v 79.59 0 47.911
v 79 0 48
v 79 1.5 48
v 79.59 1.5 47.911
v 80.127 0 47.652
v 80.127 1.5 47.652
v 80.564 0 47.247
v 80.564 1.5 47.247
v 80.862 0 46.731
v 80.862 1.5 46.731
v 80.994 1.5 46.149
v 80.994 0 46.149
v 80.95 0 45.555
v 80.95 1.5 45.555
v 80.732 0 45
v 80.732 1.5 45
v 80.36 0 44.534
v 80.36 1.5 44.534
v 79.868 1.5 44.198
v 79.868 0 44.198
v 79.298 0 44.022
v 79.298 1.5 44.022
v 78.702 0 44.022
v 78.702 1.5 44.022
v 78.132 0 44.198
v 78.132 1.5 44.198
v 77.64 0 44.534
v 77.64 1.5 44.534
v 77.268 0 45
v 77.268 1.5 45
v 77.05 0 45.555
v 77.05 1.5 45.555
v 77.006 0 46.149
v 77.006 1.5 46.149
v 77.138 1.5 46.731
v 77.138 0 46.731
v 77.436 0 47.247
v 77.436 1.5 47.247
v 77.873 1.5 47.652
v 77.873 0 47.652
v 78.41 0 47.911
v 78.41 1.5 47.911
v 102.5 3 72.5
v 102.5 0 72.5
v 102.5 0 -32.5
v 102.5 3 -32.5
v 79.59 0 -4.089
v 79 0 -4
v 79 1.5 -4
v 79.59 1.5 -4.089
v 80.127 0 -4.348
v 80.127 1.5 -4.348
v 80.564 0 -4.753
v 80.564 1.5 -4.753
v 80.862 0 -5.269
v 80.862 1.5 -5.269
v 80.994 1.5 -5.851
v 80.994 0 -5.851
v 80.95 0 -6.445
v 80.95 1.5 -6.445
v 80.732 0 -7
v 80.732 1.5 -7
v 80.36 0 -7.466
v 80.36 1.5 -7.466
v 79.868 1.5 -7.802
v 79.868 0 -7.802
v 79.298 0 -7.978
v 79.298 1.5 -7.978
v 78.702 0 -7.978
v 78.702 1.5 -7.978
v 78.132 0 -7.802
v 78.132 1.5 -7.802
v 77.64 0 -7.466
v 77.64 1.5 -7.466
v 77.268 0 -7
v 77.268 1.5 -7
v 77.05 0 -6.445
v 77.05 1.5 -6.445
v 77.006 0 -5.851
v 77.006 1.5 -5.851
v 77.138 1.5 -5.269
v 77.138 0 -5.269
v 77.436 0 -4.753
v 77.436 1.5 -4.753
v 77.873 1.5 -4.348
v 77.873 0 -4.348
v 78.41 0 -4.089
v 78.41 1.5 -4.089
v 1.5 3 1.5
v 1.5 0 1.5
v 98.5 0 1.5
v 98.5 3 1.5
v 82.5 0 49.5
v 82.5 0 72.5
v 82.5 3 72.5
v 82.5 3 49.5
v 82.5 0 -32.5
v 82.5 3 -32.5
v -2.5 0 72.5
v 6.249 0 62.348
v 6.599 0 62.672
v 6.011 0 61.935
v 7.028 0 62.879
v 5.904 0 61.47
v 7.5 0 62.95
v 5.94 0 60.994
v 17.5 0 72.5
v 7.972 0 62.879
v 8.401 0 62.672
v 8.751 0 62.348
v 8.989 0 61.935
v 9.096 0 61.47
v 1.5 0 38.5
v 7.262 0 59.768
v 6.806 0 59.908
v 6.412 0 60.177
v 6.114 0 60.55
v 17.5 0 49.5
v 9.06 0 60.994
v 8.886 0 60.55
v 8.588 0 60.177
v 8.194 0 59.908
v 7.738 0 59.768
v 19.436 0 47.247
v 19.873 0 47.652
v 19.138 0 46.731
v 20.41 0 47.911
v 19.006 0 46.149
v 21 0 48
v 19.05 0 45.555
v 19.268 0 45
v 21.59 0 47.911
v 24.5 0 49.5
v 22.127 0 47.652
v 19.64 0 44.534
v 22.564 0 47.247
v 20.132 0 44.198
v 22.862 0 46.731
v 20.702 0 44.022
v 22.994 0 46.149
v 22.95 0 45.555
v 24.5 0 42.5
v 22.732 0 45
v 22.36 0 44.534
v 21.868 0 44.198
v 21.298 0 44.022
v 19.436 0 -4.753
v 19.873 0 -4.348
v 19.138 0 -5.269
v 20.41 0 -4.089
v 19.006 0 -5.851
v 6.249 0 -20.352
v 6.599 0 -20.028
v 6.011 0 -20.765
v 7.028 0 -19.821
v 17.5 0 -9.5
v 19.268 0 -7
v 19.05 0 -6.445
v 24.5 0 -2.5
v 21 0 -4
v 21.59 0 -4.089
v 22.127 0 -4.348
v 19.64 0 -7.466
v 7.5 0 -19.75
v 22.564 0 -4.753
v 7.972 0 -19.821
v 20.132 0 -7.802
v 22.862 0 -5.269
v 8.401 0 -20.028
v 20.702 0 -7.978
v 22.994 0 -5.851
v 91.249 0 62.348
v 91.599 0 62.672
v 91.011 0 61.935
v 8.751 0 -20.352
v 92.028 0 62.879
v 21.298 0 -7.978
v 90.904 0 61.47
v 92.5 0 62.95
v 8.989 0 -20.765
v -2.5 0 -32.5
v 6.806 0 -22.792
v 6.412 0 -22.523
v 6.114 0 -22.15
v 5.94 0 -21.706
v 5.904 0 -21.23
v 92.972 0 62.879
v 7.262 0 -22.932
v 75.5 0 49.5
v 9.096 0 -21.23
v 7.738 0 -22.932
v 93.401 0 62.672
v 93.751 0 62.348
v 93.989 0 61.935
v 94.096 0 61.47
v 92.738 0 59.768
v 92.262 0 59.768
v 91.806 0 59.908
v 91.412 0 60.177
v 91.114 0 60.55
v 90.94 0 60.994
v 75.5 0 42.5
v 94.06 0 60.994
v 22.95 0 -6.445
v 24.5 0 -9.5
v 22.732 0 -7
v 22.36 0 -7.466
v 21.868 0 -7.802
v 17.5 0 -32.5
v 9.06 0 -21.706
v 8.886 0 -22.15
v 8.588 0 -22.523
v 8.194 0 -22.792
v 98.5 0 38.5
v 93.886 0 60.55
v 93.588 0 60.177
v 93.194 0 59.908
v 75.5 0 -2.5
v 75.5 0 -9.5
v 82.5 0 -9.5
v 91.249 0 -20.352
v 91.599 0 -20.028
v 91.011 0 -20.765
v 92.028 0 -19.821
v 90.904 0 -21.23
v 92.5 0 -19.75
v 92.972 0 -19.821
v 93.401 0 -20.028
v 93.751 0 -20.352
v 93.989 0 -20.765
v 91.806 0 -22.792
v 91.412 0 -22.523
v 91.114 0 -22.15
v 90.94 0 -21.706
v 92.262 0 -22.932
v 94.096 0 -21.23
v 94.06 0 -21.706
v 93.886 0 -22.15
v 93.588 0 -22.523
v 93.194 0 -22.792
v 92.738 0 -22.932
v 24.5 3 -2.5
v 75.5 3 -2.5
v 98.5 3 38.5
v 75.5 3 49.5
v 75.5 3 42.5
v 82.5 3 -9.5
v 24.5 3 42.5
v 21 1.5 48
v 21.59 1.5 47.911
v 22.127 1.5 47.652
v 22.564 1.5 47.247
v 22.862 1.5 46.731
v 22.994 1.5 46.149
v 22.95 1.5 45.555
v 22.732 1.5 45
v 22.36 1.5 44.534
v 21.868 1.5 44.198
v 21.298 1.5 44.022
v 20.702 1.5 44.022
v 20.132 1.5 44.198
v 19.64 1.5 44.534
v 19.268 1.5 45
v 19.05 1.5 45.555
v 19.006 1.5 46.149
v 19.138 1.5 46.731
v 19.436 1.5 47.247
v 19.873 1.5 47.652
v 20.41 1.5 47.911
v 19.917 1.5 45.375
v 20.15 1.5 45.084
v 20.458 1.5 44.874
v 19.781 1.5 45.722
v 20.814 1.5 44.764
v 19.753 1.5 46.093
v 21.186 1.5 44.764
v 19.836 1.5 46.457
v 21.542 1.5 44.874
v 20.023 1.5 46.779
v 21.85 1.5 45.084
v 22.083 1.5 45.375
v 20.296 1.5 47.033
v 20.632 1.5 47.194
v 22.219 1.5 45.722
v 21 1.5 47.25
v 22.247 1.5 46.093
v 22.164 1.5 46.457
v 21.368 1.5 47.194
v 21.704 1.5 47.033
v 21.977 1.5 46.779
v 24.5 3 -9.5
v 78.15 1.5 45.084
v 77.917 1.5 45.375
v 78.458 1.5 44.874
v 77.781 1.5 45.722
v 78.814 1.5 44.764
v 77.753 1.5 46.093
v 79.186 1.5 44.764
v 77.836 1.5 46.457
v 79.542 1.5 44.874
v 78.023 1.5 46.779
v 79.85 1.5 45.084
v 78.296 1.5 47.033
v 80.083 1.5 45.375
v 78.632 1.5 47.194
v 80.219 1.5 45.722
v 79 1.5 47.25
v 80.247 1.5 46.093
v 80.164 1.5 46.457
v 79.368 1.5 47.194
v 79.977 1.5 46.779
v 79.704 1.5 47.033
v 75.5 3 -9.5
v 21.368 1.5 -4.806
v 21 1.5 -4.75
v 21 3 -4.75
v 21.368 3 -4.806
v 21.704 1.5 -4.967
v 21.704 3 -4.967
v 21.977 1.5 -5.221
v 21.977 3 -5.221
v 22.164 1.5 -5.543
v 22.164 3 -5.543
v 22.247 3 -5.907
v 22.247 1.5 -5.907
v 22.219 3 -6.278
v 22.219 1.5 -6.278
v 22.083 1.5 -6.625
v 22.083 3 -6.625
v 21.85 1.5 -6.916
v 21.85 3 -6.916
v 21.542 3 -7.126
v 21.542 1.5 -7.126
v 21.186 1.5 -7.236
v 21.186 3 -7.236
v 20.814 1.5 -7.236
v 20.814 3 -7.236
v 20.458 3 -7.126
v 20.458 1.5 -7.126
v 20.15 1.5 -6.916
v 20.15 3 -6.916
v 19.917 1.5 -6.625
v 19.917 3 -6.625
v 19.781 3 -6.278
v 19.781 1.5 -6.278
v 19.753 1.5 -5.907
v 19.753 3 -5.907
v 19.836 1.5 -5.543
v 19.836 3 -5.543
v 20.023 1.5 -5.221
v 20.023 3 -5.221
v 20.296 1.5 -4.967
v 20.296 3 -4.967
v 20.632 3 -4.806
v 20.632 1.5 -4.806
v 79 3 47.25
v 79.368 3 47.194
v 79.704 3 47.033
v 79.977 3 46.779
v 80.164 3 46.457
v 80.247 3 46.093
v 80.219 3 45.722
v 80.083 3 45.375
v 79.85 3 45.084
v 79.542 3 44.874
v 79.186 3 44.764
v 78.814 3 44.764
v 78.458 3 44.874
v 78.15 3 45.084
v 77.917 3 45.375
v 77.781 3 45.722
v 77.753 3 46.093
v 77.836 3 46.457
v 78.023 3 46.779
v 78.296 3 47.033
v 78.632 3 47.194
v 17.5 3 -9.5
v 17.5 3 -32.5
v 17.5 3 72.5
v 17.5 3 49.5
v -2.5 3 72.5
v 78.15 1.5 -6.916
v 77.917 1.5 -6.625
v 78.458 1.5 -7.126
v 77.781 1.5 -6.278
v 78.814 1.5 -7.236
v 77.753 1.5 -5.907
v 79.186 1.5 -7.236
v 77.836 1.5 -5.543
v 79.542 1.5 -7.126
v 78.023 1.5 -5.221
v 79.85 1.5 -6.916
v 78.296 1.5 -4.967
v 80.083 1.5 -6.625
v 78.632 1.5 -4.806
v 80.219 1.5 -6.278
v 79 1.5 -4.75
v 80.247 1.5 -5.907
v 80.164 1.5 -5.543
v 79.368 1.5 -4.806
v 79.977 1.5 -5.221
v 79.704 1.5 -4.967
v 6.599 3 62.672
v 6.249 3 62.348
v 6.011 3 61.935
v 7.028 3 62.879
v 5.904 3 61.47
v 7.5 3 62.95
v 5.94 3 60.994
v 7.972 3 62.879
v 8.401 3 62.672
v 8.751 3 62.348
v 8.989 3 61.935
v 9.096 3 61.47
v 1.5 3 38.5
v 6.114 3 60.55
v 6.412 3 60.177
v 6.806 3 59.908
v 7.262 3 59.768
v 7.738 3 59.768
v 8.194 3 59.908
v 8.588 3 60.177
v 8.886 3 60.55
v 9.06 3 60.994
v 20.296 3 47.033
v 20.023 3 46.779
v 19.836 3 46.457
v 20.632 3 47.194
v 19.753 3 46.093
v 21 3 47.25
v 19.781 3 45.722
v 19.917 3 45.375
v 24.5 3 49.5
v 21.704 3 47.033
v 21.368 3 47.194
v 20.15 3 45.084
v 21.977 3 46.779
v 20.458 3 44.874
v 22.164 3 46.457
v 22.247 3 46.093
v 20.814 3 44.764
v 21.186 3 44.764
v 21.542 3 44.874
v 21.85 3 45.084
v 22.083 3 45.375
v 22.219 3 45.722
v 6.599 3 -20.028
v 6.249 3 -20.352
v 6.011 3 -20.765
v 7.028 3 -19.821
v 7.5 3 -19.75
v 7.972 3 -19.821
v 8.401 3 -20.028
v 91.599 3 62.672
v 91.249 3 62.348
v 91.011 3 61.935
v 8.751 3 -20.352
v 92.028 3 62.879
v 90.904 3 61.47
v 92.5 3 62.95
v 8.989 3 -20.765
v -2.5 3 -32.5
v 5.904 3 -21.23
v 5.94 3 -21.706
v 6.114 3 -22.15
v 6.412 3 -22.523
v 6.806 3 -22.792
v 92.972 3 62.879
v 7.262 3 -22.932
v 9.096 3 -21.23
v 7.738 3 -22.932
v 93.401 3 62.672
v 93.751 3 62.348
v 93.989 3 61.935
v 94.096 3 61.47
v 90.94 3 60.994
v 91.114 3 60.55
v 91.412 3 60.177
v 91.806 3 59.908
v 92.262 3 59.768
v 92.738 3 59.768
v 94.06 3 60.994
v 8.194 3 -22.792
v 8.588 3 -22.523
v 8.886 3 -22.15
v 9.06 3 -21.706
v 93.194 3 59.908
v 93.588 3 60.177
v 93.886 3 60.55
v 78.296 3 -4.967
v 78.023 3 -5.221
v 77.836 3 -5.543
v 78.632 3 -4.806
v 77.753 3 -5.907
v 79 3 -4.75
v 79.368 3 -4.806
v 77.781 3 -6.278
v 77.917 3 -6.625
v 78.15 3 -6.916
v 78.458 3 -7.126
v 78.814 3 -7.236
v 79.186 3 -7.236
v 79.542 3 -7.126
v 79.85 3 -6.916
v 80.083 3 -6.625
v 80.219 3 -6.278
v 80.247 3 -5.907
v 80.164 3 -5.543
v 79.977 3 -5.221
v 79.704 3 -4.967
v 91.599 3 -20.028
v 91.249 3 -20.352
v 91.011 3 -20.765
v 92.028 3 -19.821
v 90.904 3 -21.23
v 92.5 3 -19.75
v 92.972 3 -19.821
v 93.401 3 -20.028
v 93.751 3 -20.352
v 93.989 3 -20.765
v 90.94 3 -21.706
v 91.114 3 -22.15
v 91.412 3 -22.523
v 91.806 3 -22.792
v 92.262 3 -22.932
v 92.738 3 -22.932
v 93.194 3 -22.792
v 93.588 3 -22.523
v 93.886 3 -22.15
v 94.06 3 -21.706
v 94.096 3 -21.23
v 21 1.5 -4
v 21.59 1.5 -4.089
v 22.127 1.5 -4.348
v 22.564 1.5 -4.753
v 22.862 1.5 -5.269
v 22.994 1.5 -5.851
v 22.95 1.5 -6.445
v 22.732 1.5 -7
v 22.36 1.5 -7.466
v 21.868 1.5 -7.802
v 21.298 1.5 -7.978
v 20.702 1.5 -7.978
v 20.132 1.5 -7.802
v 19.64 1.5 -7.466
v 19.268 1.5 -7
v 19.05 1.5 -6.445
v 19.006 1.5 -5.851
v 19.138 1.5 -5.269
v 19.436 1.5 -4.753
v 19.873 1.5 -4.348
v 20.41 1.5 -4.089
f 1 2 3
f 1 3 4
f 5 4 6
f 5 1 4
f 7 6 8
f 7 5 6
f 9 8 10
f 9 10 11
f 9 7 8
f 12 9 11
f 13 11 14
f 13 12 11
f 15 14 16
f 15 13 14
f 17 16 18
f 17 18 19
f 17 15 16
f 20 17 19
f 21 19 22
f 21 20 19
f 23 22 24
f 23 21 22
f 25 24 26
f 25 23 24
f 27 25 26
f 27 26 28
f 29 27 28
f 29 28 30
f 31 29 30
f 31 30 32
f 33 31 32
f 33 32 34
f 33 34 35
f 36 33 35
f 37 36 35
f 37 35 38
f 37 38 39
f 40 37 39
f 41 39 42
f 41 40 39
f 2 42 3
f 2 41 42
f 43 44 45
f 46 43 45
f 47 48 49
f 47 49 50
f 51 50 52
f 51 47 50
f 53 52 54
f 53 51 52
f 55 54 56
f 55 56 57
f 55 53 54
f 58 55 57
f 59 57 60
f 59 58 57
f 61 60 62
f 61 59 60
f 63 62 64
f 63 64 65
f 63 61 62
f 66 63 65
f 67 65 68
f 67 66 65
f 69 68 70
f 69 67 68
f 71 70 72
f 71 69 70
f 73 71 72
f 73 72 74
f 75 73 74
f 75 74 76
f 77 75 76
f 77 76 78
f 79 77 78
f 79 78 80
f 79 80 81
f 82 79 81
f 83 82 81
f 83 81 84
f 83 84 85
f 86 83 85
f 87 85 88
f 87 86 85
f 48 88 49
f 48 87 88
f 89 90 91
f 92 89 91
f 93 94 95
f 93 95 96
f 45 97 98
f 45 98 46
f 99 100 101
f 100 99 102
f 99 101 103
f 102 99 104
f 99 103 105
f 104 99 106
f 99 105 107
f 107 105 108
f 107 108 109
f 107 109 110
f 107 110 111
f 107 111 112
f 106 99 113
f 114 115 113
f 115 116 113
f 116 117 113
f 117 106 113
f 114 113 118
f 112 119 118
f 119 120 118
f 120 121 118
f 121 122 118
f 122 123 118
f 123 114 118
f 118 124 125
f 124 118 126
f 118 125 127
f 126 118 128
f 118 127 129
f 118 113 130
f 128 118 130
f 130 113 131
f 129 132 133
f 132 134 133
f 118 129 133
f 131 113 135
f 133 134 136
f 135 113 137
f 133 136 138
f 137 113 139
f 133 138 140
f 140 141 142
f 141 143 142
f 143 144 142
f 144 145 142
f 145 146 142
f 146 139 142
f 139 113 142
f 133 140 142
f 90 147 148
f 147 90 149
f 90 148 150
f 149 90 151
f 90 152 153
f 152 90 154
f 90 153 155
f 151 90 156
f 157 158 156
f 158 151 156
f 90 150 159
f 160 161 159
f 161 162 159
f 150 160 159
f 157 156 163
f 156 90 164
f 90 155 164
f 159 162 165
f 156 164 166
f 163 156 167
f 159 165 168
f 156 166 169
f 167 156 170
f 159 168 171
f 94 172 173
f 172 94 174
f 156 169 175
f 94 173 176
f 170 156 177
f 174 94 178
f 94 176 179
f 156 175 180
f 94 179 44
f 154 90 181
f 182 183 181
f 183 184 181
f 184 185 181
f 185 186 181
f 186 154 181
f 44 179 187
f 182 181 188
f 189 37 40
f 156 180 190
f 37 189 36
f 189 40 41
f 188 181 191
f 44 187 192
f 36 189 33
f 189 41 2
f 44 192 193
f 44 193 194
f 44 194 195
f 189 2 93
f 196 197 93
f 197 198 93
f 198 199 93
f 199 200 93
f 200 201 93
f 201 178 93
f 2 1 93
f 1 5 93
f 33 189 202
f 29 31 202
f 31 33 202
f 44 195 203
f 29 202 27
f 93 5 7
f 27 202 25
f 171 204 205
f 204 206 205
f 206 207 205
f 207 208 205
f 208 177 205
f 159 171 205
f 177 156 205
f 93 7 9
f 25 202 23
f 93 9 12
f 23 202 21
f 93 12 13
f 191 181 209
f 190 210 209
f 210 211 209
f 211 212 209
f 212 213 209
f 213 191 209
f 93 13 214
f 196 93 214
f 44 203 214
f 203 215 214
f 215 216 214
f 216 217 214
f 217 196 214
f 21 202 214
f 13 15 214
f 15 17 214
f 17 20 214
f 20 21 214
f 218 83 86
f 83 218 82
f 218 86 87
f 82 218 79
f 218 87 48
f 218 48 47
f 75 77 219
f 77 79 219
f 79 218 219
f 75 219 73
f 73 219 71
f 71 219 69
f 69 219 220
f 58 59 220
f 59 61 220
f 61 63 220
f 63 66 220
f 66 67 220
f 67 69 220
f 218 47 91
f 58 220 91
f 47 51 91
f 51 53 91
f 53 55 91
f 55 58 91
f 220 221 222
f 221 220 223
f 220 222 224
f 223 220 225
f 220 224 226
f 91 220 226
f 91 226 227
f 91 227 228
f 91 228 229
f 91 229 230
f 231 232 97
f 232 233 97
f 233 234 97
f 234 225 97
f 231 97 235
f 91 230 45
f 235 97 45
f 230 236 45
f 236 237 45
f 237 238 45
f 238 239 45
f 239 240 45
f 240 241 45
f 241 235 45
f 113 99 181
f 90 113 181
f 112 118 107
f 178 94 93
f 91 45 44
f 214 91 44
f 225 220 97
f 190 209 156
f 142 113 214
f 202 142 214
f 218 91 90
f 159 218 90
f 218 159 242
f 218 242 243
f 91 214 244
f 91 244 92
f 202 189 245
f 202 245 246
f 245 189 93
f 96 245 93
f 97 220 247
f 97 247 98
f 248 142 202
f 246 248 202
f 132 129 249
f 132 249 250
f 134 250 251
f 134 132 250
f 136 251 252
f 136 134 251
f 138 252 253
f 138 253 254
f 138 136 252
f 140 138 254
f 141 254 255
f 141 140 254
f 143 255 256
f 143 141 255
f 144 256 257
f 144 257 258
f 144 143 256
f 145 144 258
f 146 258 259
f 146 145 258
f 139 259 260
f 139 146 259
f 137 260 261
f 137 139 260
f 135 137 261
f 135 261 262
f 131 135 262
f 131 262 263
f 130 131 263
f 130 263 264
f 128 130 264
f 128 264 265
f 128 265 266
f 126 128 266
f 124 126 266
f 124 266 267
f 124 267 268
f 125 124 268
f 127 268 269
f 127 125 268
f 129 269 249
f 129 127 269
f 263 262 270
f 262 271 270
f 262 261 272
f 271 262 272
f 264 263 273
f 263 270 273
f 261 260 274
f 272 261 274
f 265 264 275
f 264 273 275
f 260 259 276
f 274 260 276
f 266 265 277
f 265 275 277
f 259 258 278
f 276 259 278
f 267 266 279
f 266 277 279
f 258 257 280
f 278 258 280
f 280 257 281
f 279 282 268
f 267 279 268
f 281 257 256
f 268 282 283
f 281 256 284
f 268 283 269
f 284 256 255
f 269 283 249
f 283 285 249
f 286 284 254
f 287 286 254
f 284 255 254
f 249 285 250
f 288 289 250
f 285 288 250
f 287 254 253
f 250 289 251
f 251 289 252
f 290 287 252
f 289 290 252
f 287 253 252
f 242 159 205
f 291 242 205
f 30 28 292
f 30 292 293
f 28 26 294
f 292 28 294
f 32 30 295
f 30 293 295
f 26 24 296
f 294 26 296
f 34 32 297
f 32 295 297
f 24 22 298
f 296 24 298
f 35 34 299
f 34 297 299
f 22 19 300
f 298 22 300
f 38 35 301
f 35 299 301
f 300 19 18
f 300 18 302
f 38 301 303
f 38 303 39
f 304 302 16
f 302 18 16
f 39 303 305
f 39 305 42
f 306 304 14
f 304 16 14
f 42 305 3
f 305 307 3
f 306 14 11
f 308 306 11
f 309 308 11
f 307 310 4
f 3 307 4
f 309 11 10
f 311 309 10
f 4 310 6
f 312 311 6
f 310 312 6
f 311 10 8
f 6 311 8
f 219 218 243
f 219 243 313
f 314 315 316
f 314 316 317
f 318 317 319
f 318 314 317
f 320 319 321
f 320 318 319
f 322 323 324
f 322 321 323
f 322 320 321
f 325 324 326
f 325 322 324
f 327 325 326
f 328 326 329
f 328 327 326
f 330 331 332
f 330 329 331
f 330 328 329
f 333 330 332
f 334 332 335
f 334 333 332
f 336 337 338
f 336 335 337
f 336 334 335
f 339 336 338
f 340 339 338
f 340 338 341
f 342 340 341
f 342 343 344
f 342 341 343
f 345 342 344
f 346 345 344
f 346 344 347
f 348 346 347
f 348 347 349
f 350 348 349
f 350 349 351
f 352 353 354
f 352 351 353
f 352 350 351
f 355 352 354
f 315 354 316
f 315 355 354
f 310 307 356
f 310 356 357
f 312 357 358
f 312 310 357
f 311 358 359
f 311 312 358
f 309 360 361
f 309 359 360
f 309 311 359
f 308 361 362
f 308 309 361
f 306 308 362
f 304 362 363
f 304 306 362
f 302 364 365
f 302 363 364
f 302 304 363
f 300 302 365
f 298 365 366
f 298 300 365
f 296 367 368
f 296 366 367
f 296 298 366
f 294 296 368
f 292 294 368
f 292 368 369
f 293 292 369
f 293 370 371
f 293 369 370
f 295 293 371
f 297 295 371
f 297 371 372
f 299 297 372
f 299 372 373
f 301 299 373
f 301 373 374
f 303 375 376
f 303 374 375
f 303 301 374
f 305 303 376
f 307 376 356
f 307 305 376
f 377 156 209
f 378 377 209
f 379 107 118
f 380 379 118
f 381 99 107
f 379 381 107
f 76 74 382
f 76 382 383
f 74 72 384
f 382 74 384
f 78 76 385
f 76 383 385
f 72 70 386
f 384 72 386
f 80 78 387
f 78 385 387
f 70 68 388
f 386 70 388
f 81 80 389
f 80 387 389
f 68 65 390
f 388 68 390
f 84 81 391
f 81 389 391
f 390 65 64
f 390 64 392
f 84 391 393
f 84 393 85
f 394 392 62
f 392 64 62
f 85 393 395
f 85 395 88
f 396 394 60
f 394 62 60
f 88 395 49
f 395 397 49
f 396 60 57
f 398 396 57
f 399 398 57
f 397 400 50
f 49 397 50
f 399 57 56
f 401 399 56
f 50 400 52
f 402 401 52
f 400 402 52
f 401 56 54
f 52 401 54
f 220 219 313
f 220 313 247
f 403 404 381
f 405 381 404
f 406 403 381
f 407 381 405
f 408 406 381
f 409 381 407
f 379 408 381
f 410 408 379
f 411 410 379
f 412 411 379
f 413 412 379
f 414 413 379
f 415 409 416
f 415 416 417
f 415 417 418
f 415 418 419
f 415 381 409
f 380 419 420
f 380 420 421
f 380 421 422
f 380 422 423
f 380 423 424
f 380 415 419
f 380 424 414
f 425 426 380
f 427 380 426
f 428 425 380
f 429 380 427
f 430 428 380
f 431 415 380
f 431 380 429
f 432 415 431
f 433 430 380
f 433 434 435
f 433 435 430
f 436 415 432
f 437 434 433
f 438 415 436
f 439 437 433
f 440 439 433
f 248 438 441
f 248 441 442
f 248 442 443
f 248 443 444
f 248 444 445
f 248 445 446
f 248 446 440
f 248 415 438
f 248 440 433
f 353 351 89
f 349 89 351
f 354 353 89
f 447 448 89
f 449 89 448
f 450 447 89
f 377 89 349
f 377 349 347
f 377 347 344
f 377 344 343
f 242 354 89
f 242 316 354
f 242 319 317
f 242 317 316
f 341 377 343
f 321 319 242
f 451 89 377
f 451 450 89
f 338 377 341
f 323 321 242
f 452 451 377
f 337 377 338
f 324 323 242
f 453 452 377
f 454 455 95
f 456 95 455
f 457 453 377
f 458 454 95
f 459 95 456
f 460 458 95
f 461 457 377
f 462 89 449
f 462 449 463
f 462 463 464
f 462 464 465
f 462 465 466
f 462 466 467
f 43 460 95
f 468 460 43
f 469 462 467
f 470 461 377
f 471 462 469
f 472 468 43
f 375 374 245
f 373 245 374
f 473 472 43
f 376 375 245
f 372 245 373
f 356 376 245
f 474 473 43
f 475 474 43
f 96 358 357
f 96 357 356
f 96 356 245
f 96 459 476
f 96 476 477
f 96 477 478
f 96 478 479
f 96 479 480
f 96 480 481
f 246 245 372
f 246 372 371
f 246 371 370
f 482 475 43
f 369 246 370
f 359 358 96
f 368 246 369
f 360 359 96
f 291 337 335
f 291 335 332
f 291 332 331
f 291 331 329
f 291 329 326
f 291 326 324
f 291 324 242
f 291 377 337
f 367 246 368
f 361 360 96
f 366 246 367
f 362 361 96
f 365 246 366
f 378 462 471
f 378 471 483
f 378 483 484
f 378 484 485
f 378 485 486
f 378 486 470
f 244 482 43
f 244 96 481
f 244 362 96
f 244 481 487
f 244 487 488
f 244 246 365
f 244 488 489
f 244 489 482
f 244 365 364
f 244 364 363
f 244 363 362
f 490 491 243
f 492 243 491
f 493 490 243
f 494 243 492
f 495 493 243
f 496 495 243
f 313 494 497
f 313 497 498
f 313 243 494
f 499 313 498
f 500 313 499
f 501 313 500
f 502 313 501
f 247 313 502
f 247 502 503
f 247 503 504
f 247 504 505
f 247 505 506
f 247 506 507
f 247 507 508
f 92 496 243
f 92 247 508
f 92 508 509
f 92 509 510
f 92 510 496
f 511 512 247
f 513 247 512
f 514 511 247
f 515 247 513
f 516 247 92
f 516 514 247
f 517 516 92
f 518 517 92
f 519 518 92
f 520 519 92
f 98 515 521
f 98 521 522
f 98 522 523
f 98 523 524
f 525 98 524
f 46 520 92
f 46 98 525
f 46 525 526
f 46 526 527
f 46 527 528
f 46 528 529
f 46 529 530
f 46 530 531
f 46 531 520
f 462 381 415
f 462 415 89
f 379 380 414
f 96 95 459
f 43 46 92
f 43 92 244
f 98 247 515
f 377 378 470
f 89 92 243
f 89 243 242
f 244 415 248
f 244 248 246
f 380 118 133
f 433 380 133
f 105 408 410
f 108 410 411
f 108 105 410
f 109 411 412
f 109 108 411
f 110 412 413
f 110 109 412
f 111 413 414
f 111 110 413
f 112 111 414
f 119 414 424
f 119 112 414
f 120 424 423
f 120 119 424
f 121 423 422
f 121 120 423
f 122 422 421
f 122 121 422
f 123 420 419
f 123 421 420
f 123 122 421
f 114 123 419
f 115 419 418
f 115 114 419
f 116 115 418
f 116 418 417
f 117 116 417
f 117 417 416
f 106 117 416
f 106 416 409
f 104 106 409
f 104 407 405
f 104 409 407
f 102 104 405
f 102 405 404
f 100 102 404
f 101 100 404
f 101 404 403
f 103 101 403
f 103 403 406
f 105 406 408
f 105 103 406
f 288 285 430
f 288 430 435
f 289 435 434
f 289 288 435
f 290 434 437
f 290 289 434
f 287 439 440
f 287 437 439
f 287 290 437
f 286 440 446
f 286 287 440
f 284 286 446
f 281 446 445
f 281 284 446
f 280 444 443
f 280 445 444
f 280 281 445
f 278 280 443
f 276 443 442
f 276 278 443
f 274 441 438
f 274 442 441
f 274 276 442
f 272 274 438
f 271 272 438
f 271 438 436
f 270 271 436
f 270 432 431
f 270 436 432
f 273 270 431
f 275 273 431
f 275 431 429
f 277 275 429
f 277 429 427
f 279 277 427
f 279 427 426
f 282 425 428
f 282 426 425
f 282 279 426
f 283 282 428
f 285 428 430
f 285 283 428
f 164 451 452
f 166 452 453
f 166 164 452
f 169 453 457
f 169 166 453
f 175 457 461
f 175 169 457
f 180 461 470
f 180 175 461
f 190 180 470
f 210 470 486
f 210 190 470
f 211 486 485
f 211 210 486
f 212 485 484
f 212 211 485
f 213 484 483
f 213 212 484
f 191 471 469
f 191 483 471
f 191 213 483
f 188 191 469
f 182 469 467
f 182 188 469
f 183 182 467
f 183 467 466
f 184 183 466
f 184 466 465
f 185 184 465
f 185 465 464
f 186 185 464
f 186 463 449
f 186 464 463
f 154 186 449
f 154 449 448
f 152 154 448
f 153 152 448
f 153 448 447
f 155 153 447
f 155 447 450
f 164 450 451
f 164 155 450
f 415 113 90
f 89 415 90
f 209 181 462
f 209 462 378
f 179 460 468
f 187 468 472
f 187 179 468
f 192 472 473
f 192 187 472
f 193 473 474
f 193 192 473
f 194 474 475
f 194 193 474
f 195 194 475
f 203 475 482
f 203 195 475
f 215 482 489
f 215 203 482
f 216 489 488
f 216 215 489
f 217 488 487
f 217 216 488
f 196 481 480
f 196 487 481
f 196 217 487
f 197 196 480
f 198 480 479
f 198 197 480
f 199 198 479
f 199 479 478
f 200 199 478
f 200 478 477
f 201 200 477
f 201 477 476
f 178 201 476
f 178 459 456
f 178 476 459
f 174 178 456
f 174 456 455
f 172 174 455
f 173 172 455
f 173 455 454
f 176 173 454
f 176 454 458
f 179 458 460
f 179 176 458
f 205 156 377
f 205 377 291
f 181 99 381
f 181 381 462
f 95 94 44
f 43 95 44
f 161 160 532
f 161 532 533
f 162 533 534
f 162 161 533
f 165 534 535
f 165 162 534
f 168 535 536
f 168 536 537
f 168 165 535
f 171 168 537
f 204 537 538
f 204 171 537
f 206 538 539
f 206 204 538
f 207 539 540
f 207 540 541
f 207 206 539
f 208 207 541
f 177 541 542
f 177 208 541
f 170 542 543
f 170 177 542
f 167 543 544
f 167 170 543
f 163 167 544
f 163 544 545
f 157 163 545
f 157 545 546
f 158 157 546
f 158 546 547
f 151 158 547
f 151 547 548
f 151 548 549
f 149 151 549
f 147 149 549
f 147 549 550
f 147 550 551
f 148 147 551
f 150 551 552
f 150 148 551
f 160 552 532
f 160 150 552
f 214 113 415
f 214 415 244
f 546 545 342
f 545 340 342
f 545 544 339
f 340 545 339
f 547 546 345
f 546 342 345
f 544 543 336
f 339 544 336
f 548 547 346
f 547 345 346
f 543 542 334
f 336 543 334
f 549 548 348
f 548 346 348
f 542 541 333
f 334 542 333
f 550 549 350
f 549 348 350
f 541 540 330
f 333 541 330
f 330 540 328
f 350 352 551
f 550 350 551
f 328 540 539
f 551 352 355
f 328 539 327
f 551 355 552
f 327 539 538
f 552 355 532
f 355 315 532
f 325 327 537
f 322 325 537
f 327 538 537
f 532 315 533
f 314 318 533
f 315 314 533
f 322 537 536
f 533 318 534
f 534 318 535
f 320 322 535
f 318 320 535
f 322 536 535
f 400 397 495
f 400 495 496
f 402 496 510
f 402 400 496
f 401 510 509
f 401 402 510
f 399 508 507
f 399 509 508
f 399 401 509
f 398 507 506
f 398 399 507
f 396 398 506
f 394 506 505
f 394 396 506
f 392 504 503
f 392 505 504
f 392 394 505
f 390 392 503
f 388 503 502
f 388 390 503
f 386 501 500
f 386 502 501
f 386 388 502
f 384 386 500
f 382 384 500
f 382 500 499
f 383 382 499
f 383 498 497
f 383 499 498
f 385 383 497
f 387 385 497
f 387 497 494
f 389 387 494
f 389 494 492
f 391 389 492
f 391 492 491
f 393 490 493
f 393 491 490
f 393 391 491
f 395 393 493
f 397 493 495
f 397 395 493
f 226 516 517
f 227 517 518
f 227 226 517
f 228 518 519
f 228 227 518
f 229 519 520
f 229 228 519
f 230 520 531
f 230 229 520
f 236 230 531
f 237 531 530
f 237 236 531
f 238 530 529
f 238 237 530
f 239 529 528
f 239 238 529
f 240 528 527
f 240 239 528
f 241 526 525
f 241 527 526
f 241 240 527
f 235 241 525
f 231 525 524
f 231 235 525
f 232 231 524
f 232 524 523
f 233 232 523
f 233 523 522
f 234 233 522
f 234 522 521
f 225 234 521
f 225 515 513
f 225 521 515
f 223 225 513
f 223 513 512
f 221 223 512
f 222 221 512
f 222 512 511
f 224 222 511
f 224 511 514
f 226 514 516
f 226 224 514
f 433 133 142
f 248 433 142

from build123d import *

# Parameters (mm, degrees)
SKETCH_1_W          = 20
SKETCH_1_H          = 105
SKETCH_1_W_2        = 65
SKETCH_1_H_2        = 45
SKETCH_1_W_3        = 7
SKETCH_1_H_3        = 59
EXTRUDE_2_DEPTH     = 3
SKETCH_1_5_W        = 97
SKETCH_1_5_H        = 37
CUT_EXTRUDE_1_DEPTH = 126.584632818
SKETCH_1_6_R        = 1.25
SKETCH_1_6_R_2      = 1.6
CUT_EXTRUDE_3_DEPTH = 126.584632818
SKETCH_1_7_R        = 2
CUT_EXTRUDE_4_DEPTH = 1.5


with BuildPart() as part:
    # 草图1 → 凸台-拉伸2 (new body)
    with BuildSketch(Plane(origin=(0, 0, 0), x_dir=(1, 0, 0), z_dir=(0, 1, 0))):
        with Locations((7.5, -20)):
            Rectangle(SKETCH_1_W, SKETCH_1_H)
        with Locations((92.5, -20)):
            Rectangle(SKETCH_1_W, SKETCH_1_H)
        with Locations((50, -20)):
            Rectangle(SKETCH_1_W_2, SKETCH_1_H_2)
        with Locations((21, -20)):
            Rectangle(SKETCH_1_W_3, SKETCH_1_H_3)
        with Locations((79, -20)):
            Rectangle(SKETCH_1_W_3, SKETCH_1_H_3)
    extrude(amount=EXTRUDE_2_DEPTH)

    # 草图1<5> → 切除-拉伸1 (cut, through all)
    with BuildSketch(Plane(origin=(0, 0, 0), x_dir=(1, 0, 0), z_dir=(0, 1, 0))):
        with Locations((50, -20)):
            Rectangle(SKETCH_1_5_W, SKETCH_1_5_H)
    extrude(amount=CUT_EXTRUDE_1_DEPTH, mode=Mode.SUBTRACT)

    # 草图1<6> → 切除-拉伸3 (cut, through all)
    with BuildSketch(Plane(origin=(0, 0, 0), x_dir=(1, 0, 0), z_dir=(0, 1, 0))):
        with Locations((21, 6)):
            Circle(SKETCH_1_6_R)
        with Locations((79, 6)):
            Circle(SKETCH_1_6_R)
        with Locations((79, -46)):
            Circle(SKETCH_1_6_R)
        with Locations((21, -46)):
            Circle(SKETCH_1_6_R)
        with Locations((7.5, 21.35)):
            Circle(SKETCH_1_6_R_2)
        with Locations((92.5, 21.35)):
            Circle(SKETCH_1_6_R_2)
        with Locations((92.5, -61.35)):
            Circle(SKETCH_1_6_R_2)
        with Locations((7.5, -61.35)):
            Circle(SKETCH_1_6_R_2)
    extrude(amount=CUT_EXTRUDE_3_DEPTH, mode=Mode.SUBTRACT)

    # 草图1<7> → 切除-拉伸4 (cut)
    with BuildSketch(Plane(origin=(0, 0, 0), x_dir=(1, 0, 0), z_dir=(0, 1, 0))):
        with Locations((21, 6)):
            Circle(SKETCH_1_7_R)
        with Locations((79, 6)):
            Circle(SKETCH_1_7_R)
        with Locations((79, -46)):
            Circle(SKETCH_1_7_R)
        with Locations((21, -46)):
            Circle(SKETCH_1_7_R)
    extrude(amount=CUT_EXTRUDE_4_DEPTH, mode=Mode.SUBTRACT)


solid = part.part
